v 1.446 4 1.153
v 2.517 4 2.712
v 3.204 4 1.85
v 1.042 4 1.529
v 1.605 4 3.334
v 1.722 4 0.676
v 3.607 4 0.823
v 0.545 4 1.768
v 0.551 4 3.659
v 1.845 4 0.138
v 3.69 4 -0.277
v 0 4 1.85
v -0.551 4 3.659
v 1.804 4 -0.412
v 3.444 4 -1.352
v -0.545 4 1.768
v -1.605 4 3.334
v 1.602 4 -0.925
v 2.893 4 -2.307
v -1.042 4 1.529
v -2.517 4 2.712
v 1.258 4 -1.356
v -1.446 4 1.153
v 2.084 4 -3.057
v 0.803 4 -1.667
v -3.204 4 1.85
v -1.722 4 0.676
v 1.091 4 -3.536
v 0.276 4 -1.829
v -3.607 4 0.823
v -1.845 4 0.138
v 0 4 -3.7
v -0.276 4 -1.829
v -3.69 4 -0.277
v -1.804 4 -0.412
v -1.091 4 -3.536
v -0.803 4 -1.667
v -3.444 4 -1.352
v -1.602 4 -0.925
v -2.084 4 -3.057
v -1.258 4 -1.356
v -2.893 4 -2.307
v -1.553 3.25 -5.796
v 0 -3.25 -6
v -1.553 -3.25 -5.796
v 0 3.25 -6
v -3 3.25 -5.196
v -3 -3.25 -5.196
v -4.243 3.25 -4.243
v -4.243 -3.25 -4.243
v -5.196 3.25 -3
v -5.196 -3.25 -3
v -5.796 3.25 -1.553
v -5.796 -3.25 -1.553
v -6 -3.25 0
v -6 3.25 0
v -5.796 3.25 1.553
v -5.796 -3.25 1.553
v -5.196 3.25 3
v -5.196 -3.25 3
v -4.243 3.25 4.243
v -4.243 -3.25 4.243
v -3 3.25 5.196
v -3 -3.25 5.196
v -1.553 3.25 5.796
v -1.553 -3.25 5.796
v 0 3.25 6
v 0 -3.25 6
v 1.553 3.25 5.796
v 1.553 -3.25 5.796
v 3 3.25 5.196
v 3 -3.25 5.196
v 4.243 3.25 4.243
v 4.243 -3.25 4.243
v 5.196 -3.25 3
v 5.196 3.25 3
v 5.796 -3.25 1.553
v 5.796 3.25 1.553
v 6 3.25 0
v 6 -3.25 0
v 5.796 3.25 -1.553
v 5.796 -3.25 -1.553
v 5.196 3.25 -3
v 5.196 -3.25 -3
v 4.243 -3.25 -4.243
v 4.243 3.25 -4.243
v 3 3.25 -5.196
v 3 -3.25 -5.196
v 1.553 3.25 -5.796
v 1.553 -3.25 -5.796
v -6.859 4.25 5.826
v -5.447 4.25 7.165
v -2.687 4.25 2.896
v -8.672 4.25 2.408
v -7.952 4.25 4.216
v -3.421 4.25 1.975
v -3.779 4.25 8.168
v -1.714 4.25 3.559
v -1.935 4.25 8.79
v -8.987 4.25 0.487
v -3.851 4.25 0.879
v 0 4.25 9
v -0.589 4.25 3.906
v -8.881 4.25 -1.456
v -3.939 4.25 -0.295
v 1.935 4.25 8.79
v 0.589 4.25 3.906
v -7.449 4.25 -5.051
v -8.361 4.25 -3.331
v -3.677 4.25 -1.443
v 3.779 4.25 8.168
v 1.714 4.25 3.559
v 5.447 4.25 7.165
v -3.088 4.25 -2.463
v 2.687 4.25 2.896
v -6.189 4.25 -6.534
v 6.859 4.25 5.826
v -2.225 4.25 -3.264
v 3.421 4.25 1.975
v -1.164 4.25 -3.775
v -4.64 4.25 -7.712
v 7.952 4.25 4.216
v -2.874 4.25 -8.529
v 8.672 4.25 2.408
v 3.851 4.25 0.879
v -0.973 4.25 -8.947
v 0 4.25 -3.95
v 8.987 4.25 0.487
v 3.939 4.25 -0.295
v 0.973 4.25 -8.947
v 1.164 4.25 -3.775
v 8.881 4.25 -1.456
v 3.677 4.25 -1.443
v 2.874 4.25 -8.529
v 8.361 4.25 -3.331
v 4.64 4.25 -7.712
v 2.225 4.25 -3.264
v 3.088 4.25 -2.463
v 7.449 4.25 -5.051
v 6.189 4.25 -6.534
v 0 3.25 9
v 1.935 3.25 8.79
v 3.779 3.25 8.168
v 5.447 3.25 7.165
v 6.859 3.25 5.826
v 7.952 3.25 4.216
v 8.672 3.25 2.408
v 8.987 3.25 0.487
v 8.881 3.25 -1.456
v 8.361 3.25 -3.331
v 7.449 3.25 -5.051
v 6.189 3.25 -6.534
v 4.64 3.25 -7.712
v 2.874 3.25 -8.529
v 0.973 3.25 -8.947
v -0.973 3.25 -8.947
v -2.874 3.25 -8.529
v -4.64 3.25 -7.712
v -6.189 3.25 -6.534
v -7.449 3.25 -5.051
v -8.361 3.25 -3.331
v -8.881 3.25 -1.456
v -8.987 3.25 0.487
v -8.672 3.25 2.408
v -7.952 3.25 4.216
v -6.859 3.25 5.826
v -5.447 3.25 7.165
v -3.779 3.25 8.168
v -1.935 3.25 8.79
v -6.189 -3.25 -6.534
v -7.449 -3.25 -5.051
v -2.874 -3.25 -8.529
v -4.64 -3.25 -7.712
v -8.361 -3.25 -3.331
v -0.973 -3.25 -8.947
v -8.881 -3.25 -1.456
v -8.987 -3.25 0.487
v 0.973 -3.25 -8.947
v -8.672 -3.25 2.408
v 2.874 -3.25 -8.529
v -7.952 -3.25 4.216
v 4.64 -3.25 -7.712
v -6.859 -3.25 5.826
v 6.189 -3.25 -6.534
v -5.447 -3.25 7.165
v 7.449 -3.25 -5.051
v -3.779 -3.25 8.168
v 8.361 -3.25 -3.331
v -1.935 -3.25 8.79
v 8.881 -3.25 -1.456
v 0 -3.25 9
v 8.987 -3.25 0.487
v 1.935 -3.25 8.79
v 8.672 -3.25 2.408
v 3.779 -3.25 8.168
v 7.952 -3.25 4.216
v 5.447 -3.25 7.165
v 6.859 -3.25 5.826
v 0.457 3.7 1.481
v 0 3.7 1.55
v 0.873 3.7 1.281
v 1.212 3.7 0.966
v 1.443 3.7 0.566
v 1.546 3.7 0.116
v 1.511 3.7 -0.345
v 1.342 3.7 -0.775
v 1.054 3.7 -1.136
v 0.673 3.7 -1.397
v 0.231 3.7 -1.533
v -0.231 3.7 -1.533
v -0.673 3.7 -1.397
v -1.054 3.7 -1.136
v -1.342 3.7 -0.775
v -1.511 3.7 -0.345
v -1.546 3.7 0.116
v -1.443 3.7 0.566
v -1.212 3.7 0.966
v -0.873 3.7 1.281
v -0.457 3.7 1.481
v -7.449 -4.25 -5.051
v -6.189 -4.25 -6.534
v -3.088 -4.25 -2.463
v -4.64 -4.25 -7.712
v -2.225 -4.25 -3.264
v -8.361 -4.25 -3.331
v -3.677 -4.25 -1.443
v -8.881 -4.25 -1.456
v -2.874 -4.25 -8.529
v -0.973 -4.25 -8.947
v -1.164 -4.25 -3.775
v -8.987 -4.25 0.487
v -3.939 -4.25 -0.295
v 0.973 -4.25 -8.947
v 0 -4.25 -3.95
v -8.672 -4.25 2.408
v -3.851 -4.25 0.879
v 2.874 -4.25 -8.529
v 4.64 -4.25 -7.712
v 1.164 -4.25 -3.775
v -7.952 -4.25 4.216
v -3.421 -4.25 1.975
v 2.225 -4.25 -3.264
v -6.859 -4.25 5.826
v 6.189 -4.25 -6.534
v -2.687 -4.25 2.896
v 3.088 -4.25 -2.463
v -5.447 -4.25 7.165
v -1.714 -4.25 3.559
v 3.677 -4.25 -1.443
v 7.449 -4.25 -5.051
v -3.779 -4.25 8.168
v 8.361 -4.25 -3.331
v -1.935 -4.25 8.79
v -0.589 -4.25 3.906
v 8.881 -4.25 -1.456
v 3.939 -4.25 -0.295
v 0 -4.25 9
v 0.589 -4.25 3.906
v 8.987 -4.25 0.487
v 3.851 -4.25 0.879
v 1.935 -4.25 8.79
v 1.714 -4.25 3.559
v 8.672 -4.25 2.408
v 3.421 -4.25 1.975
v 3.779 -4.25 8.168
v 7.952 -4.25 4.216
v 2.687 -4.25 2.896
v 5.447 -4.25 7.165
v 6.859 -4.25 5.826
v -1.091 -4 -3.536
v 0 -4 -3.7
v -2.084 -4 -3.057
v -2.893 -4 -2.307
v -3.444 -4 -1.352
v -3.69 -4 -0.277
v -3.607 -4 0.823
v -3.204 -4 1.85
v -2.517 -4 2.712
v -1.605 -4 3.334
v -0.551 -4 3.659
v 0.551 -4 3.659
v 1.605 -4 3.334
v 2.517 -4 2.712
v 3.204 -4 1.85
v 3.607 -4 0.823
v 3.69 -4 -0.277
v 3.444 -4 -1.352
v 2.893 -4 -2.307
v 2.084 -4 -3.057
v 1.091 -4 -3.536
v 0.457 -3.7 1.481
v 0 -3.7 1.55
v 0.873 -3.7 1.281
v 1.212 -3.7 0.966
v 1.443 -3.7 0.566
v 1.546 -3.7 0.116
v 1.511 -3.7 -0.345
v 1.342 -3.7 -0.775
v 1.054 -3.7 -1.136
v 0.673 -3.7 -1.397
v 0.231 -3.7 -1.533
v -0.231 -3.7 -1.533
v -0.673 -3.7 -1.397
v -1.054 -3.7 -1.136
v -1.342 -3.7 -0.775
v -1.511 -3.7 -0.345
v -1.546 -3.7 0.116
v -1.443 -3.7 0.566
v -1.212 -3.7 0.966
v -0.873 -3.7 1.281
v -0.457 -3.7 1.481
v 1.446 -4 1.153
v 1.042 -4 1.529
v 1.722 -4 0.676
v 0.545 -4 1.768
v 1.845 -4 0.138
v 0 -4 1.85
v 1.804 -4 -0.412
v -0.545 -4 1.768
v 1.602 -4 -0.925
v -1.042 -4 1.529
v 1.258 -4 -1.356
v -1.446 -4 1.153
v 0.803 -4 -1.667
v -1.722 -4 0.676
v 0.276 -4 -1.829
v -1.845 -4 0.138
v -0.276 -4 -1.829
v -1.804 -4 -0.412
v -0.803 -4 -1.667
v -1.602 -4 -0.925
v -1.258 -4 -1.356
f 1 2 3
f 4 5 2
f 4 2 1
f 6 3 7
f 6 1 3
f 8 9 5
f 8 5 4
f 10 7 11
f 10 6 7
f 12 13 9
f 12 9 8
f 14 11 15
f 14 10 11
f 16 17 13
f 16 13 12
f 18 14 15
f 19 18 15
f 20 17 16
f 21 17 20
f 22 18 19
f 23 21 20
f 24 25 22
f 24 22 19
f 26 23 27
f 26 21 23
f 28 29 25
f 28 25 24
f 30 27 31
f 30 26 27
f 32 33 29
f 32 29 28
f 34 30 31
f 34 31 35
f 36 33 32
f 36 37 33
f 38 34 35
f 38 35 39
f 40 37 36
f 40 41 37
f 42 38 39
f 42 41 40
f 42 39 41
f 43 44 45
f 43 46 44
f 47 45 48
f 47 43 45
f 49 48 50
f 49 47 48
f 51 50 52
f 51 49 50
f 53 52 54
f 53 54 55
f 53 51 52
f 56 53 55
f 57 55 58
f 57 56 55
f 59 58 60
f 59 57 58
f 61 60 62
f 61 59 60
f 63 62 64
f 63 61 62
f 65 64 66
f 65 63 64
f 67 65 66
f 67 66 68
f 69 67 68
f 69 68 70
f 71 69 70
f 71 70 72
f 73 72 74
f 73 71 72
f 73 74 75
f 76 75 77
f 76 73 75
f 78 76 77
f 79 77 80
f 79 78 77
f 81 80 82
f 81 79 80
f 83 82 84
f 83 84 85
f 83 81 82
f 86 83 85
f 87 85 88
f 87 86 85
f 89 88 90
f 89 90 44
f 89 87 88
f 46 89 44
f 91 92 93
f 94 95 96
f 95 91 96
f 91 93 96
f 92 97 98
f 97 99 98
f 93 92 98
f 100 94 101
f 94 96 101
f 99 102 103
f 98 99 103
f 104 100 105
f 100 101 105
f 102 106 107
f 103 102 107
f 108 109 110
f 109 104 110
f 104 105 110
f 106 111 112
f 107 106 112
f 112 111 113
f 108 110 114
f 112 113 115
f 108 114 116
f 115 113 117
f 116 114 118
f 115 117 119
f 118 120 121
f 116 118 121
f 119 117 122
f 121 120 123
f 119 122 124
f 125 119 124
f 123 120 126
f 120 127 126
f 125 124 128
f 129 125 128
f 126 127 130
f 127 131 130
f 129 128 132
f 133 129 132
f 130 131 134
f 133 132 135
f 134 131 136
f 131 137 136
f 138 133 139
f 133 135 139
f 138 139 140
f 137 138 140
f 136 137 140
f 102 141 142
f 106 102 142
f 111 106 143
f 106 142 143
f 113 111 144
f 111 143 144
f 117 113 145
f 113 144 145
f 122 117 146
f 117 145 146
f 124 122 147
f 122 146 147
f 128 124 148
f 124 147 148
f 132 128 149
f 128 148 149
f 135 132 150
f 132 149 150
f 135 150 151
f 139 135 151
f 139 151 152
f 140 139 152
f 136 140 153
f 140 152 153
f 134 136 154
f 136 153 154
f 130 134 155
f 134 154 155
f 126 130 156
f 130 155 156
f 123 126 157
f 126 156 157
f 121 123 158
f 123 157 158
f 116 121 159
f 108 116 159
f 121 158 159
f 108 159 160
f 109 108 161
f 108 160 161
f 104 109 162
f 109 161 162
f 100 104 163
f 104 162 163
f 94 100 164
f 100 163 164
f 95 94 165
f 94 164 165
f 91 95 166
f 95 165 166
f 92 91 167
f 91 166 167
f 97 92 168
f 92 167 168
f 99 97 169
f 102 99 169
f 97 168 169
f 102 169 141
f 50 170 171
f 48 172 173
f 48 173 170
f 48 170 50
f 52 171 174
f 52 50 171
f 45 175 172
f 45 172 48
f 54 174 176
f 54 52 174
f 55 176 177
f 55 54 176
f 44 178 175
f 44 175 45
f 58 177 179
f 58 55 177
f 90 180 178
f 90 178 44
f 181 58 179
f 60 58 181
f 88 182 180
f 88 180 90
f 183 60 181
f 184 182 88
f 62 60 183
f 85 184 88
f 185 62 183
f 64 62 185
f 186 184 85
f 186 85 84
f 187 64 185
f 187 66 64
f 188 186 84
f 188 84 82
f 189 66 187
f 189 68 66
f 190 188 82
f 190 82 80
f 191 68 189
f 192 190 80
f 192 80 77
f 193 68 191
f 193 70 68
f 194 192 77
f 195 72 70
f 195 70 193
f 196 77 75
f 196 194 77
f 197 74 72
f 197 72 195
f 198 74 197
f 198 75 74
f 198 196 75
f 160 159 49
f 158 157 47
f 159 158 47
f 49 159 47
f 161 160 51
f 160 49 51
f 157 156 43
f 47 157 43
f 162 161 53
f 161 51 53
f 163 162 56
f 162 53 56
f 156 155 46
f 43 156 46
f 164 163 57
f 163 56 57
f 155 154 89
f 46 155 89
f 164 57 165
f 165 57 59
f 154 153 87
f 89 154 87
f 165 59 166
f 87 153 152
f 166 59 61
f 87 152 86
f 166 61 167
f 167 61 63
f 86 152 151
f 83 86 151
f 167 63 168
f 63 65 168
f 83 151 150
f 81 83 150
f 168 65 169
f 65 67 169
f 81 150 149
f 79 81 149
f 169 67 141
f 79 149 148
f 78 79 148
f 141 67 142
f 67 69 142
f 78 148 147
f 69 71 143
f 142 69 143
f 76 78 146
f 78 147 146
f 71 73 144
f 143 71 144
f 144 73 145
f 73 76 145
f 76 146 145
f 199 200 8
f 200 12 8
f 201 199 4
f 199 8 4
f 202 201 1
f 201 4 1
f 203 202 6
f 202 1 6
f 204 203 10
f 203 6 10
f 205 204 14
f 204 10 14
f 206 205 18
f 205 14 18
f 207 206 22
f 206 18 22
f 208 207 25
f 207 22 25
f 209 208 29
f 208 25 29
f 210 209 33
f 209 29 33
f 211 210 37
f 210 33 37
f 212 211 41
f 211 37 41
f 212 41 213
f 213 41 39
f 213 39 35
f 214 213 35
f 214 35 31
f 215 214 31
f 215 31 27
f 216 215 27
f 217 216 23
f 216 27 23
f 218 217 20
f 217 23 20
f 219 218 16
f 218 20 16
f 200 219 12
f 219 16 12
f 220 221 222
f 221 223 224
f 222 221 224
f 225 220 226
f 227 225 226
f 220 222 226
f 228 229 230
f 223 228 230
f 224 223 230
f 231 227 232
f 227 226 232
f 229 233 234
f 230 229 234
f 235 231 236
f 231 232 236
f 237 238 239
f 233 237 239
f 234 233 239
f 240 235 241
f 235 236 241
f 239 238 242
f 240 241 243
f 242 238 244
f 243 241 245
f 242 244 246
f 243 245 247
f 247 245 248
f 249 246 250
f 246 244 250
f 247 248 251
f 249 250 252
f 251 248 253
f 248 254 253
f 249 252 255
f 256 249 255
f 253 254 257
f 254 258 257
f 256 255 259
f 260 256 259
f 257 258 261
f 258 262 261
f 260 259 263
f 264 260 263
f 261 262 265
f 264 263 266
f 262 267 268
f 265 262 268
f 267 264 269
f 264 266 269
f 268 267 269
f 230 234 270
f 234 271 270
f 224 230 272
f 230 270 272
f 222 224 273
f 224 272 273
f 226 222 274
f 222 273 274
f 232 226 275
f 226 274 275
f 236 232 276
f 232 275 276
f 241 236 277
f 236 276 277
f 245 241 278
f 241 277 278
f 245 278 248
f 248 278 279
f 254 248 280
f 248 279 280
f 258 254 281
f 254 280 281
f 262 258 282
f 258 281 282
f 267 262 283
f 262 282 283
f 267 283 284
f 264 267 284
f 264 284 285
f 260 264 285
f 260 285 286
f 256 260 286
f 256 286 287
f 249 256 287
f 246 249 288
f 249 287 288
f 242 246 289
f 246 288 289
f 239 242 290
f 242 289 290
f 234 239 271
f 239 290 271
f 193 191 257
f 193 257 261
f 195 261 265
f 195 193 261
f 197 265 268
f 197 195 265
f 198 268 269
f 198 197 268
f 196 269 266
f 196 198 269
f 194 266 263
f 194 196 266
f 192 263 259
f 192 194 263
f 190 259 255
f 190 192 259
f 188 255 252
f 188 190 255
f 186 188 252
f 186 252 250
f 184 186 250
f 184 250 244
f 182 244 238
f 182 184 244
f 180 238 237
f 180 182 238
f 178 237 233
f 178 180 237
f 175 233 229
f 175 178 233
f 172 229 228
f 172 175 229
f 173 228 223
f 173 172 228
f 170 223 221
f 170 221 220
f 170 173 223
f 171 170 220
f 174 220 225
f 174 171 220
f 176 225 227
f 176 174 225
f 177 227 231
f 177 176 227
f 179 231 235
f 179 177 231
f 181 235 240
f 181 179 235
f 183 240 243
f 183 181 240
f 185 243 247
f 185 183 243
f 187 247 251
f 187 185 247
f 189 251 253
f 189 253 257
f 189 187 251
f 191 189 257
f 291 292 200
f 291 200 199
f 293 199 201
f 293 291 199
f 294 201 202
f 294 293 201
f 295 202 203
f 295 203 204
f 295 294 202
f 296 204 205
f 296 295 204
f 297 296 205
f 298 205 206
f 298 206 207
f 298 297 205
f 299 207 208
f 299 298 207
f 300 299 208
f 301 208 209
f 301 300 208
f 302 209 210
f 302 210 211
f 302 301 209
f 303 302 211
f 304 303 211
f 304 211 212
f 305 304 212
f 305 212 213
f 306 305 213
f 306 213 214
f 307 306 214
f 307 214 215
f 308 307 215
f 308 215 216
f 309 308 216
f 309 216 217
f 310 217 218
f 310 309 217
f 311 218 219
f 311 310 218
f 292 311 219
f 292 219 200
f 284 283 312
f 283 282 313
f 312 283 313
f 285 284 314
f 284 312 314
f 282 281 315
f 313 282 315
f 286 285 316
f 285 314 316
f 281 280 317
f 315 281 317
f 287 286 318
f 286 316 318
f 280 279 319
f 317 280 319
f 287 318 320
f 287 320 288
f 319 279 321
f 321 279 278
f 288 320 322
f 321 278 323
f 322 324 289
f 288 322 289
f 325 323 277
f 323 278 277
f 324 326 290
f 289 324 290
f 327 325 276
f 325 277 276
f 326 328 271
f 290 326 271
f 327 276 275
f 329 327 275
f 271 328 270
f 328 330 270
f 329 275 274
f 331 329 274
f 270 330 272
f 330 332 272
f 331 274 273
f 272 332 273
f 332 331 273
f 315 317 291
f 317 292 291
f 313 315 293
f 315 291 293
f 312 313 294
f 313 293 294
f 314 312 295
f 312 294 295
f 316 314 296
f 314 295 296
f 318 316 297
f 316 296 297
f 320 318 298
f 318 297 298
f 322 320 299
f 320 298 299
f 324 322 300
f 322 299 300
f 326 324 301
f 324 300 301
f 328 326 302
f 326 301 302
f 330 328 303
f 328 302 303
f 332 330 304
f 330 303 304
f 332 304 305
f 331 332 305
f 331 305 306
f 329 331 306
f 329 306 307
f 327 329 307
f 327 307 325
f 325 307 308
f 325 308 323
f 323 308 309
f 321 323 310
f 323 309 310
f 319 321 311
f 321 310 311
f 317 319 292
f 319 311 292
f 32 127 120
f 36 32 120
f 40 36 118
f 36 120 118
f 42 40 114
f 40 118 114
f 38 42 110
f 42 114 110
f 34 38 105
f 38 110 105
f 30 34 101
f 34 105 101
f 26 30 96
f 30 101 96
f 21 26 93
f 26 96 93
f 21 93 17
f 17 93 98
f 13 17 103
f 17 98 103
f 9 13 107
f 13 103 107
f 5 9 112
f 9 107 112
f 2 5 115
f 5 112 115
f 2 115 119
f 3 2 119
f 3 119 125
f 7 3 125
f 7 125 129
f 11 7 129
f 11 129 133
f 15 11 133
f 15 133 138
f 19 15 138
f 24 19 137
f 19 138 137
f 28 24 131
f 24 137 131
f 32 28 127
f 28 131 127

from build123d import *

# Parameters (mm, degrees)
SKETCH1_R           = 6
BOSS_EXTRUDE1_DEPTH = 3.25
SKETCH2_R           = 9
BOSS_EXTRUDE2_DEPTH = 1
SKETCH4_R           = 4
CUT_EXTRUDE1_DEPTH  = 16.305227865
SKETCH7_R           = 4
SKETCH7_R_2         = 1.55
BOSS_EXTRUDE4_DEPTH = 4
CHAMFER2_SIZE       = 0.3


with BuildPart() as part:
    # Sketch1 → Boss-Extrude1 (new, symmetric)
    with BuildSketch(Plane(origin=(0, 0, 0), x_dir=(1, 0, 0), z_dir=(0, 1, 0))):
        with Locations(Location((0, 0, 0), (0, 0, 90))):
            Circle(SKETCH1_R)
    extrude(amount=BOSS_EXTRUDE1_DEPTH, both=True)

    # Sketch2 → Boss-Extrude2 (add)
    with BuildSketch(Plane(origin=(0, 3.25, 0), x_dir=(1, 0, 0), z_dir=(0, 1, 0))):
        with Locations(Location((0, 0, 0), (0, 0, 270))):
            Circle(SKETCH2_R)
    boss_extrude2 = extrude(amount=BOSS_EXTRUDE2_DEPTH)

    # Mirror3: Boss-Extrude2 across plane
    add(boss_extrude2.mirror(Plane.ZX))

    # Sketch4 → Cut-Extrude1 (cut, through all)
    with BuildSketch(Plane.XZ.offset(4.25)):
        with Locations(Location((0, 0, 0), (0, 0, 270))):
            Circle(SKETCH4_R)
    extrude(amount=-CUT_EXTRUDE1_DEPTH, mode=Mode.SUBTRACT)

    # Sketch7 → Boss-Extrude4 (add, symmetric)
    with BuildSketch(Plane(origin=(0, 0, 0), x_dir=(1, 0, 0), z_dir=(0, 1, 0))):
        with Locations(Location((0, 0, 0), (0, 0, 90))):
            Circle(SKETCH7_R)
        with Locations(Location((0, 0, 0), (0, 0, 270))):
            Circle(SKETCH7_R_2, mode=Mode.SUBTRACT)
    extrude(amount=BOSS_EXTRUDE4_DEPTH, both=True)

    # Chamfer2
    # the kernel refuses this chamfer: 0.3 mm, written as the material it adds along each edge
    with BuildSketch(Plane(origin=(0, 4, 0), x_dir=(0, 0, -1), z_dir=(1, 0, 0))) as chamfer2_piece_1_section:
        Polygon((4 - CHAMFER2_SIZE, 0), (4, CHAMFER2_SIZE), (4, 0), align=None)
    chamfer2_piece_1 = revolve(axis=Axis((0, 4, 0), (0, 1, 0)), mode=Mode.PRIVATE)
    chamfer2_piece_1 = split(chamfer2_piece_1, bisect_by=Plane(origin=(0, 4.25, 3.828198445), z_dir=(0, -1, 0)), keep=Keep.TOP, mode=Mode.PRIVATE)
    add(chamfer2_piece_1)
    with BuildSketch(Plane(origin=(0, -4, 0), x_dir=(0, 0, -1), z_dir=(1, 0, 0))) as chamfer2_piece_2_section:
        Polygon((4, -CHAMFER2_SIZE), (4 - CHAMFER2_SIZE, 0), (4, 0), align=None)
    chamfer2_piece_2 = revolve(axis=Axis((0, -4, 0), (0, 1, 0)), mode=Mode.PRIVATE)
    chamfer2_piece_2 = split(chamfer2_piece_2, bisect_by=Plane(origin=(0, -4.25, 3.828198445), z_dir=(0, 1, 0)), keep=Keep.TOP, mode=Mode.PRIVATE)
    add(chamfer2_piece_2)
    # the kernel refuses this chamfer: 0.3 mm, written as the material it takes off along each edge
    with BuildSketch(Plane(origin=(0, 4, 0), x_dir=(0, 0, 1), z_dir=(-1, 0, 0))) as chamfer2_2_piece_1:
        Polygon((1.55, -CHAMFER2_SIZE), (1.55 + CHAMFER2_SIZE, 0), (1.55, 0), align=None)
    revolve(axis=Axis((0, 4, 0), (0, 1, 0)), mode=Mode.SUBTRACT)
    with BuildSketch(Plane(origin=(0, -4, 0), x_dir=(0, 0, 1), z_dir=(-1, 0, 0))) as chamfer2_2_piece_2:
        Polygon((1.55 + CHAMFER2_SIZE, 0), (1.55, CHAMFER2_SIZE), (1.55, 0), align=None)
    revolve(axis=Axis((0, -4, 0), (0, 1, 0)), mode=Mode.SUBTRACT)


solid = part.part
